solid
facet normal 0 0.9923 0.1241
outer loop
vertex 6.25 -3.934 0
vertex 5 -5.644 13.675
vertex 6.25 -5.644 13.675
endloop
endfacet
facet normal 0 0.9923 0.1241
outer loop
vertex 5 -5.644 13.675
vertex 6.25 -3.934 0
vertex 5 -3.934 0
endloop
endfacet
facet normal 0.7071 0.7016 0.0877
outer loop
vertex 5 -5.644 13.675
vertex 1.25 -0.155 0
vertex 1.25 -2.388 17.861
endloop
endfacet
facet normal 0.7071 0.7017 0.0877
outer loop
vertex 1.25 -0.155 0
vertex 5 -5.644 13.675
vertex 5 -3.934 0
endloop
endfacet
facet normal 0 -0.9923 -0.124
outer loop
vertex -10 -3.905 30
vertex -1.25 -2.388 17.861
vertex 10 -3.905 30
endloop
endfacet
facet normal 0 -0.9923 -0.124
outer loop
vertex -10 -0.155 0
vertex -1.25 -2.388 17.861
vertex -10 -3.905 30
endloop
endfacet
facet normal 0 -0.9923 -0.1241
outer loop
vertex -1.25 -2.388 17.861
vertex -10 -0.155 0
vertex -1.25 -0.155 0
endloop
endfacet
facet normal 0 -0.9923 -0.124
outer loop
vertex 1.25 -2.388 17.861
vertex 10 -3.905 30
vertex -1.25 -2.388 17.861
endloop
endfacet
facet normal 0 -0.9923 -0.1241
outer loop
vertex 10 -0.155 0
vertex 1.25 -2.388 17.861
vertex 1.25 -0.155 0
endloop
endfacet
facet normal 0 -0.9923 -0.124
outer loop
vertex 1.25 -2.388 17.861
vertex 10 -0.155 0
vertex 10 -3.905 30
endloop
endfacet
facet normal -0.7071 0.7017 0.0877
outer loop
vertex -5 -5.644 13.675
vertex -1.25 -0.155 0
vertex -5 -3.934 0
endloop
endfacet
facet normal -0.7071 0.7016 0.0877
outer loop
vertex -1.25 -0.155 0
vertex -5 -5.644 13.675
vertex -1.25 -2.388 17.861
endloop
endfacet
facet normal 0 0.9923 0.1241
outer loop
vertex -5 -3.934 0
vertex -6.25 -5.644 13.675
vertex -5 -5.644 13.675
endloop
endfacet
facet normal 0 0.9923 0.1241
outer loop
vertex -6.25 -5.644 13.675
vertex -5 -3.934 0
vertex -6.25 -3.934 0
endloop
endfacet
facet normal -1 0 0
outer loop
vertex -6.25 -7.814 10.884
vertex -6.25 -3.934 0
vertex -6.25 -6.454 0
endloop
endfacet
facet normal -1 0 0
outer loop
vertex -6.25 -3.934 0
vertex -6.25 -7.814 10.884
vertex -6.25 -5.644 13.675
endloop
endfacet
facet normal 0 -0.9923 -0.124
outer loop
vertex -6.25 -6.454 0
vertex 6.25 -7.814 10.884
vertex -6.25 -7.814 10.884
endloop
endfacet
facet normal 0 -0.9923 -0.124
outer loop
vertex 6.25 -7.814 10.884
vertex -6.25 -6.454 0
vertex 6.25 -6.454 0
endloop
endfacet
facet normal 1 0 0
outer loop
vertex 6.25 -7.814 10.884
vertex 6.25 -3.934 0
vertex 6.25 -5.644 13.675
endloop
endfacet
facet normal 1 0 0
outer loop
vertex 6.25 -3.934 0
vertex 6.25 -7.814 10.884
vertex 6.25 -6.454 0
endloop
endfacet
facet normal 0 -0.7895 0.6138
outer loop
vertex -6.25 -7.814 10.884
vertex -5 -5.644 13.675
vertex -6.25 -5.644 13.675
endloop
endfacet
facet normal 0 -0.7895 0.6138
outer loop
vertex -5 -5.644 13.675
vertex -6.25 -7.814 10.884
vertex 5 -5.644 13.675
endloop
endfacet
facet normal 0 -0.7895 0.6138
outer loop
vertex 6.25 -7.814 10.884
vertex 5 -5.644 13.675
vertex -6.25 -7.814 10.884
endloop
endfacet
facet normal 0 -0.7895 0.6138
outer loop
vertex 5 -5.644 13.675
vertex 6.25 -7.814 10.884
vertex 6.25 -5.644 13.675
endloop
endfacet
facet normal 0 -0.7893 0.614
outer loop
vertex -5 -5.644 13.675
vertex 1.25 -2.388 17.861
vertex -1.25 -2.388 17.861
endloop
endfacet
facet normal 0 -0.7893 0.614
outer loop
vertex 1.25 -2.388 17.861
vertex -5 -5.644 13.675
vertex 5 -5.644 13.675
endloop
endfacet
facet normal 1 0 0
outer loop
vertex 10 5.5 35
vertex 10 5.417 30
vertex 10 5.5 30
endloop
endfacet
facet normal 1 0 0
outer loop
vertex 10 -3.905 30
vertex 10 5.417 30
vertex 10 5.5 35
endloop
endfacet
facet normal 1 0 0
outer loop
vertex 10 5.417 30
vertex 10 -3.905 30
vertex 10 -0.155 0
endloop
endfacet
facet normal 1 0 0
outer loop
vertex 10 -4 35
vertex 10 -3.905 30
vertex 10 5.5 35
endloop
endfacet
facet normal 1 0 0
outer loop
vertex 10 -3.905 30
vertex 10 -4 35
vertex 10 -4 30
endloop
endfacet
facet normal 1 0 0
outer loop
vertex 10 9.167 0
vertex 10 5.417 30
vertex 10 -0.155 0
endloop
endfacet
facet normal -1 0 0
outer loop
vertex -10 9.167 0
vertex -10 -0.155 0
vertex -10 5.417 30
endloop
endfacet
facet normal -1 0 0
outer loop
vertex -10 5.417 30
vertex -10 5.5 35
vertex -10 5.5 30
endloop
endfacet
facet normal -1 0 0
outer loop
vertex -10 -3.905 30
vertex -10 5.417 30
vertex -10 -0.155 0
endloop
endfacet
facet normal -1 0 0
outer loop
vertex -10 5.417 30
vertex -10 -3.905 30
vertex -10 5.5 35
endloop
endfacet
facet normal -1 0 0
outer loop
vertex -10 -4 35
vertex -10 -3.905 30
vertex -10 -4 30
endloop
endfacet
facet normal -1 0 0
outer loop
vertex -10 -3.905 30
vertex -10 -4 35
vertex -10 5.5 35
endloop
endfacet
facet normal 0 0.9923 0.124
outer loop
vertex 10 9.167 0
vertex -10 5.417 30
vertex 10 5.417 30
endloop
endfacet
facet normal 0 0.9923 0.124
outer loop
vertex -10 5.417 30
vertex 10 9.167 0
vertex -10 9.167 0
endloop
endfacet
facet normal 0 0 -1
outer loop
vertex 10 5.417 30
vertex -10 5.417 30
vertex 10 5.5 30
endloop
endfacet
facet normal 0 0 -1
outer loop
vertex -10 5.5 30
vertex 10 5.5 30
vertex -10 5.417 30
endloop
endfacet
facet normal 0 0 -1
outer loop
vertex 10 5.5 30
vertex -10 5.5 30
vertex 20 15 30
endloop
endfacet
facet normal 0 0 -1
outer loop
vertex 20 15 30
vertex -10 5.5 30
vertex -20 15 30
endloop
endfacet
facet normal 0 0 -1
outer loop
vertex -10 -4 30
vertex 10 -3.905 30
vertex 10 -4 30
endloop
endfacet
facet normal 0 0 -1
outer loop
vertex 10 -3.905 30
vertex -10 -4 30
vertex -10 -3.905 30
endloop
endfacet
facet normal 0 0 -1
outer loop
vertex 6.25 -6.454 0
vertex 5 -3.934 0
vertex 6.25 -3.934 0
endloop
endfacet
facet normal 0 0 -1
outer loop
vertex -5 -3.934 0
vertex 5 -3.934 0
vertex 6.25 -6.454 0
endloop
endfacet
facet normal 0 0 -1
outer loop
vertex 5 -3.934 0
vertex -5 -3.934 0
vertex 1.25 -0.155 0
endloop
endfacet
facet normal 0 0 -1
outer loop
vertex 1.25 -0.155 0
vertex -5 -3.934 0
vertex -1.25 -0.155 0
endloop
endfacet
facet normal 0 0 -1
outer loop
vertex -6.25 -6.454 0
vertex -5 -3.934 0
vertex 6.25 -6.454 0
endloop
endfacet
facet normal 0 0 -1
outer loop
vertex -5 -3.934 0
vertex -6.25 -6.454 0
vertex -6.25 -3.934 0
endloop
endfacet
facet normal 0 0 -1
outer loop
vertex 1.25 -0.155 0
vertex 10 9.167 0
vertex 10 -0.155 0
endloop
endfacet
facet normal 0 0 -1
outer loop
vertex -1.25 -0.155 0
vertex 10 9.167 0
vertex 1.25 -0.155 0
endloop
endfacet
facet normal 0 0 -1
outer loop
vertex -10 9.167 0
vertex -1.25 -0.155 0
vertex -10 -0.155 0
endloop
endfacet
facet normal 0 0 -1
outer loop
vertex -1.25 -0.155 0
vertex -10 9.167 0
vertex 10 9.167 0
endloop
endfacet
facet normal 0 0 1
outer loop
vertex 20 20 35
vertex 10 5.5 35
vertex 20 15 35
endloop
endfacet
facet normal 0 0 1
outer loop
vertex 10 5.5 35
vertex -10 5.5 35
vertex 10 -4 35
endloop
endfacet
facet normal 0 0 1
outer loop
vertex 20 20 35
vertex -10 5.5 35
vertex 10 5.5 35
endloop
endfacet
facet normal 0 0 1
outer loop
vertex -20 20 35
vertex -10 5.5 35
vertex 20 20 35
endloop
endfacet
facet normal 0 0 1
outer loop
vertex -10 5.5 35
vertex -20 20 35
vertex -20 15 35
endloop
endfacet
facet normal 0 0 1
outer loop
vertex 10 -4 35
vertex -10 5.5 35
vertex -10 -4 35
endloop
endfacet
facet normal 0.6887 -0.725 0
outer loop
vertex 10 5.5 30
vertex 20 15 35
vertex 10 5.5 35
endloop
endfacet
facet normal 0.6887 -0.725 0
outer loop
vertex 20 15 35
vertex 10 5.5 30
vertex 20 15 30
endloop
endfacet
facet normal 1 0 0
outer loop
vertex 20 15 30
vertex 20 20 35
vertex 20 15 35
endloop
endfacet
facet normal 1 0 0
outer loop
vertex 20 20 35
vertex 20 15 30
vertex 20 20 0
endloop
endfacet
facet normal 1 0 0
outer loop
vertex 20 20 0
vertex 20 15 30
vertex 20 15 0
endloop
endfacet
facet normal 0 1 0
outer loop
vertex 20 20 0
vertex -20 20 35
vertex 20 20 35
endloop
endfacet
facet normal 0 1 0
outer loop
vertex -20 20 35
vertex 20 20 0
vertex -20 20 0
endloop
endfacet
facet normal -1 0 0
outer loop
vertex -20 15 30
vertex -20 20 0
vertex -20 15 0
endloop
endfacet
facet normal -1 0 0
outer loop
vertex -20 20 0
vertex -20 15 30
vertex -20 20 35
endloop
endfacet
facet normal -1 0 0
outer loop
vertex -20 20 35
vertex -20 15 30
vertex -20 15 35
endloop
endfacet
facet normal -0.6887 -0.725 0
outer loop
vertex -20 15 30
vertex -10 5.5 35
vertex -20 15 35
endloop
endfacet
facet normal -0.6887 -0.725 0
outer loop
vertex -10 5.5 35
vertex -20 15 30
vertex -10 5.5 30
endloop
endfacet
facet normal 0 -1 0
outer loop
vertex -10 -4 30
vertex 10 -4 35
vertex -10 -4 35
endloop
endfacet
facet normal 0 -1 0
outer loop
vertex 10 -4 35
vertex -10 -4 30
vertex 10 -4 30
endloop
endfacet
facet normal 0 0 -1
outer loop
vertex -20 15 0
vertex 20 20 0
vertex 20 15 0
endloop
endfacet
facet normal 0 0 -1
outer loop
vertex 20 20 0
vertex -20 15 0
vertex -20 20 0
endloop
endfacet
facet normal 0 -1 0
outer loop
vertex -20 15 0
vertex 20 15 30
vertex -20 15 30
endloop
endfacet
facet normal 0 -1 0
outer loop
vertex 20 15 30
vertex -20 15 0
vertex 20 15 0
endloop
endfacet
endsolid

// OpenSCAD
// file: defs.scad
width = 10;
height = 80;
angle = atan (width / height);
diag = height / cos(angle) + width * tan(angle);
slack = 0.75;

up_down_trim = width*sin(angle);

module slot_poly (slot_slack) {
    polygon ([
        [7-slot_slack, -7+slot_slack],
        [-7+slot_slack, -7+slot_slack],
        [-7+slot_slack, -3-slot_slack],
        [-5, -3-slot_slack],
        [-2+slot_slack, 0],
        [2-slot_slack, 0],
        [5, -3-slot_slack],
        [7-slot_slack, -3-slot_slack]
    ]);
}
// main file
include <defs.scad>;

difference () {
    translate ([0,0,-up_down_trim])
    rotate ([angle, 0, 0]) {
        linear_extrude (35) {
            polygon ([
                [10, width-slack],
                [-10, width-slack],
                [-10, 0],
                [10, 0]
            ]);
        }
        difference () {
            linear_extrude (20)
                slot_poly (slack);
            translate ([-15, -7+slack, 13])
                rotate ([45,0,0]) cube(30);
        }
    }
    translate ([-15, -15, 30]) cube(30);
    translate ([-15, -15, -30]) cube(30);
}

translate ([0, 0, 30])
linear_extrude (5)
polygon ([
    [-10, -4],
    [10, -4],
    [10, 5.5],
    [20, 15],
    [20, 20],
    [-20, 20],
    [-20, 15],
    [-10, 5.5]
]);

linear_extrude (35)
polygon ([
    [20, 20],
    [20, 15],
    [-20, 15],
    [-20, 20]
]);
